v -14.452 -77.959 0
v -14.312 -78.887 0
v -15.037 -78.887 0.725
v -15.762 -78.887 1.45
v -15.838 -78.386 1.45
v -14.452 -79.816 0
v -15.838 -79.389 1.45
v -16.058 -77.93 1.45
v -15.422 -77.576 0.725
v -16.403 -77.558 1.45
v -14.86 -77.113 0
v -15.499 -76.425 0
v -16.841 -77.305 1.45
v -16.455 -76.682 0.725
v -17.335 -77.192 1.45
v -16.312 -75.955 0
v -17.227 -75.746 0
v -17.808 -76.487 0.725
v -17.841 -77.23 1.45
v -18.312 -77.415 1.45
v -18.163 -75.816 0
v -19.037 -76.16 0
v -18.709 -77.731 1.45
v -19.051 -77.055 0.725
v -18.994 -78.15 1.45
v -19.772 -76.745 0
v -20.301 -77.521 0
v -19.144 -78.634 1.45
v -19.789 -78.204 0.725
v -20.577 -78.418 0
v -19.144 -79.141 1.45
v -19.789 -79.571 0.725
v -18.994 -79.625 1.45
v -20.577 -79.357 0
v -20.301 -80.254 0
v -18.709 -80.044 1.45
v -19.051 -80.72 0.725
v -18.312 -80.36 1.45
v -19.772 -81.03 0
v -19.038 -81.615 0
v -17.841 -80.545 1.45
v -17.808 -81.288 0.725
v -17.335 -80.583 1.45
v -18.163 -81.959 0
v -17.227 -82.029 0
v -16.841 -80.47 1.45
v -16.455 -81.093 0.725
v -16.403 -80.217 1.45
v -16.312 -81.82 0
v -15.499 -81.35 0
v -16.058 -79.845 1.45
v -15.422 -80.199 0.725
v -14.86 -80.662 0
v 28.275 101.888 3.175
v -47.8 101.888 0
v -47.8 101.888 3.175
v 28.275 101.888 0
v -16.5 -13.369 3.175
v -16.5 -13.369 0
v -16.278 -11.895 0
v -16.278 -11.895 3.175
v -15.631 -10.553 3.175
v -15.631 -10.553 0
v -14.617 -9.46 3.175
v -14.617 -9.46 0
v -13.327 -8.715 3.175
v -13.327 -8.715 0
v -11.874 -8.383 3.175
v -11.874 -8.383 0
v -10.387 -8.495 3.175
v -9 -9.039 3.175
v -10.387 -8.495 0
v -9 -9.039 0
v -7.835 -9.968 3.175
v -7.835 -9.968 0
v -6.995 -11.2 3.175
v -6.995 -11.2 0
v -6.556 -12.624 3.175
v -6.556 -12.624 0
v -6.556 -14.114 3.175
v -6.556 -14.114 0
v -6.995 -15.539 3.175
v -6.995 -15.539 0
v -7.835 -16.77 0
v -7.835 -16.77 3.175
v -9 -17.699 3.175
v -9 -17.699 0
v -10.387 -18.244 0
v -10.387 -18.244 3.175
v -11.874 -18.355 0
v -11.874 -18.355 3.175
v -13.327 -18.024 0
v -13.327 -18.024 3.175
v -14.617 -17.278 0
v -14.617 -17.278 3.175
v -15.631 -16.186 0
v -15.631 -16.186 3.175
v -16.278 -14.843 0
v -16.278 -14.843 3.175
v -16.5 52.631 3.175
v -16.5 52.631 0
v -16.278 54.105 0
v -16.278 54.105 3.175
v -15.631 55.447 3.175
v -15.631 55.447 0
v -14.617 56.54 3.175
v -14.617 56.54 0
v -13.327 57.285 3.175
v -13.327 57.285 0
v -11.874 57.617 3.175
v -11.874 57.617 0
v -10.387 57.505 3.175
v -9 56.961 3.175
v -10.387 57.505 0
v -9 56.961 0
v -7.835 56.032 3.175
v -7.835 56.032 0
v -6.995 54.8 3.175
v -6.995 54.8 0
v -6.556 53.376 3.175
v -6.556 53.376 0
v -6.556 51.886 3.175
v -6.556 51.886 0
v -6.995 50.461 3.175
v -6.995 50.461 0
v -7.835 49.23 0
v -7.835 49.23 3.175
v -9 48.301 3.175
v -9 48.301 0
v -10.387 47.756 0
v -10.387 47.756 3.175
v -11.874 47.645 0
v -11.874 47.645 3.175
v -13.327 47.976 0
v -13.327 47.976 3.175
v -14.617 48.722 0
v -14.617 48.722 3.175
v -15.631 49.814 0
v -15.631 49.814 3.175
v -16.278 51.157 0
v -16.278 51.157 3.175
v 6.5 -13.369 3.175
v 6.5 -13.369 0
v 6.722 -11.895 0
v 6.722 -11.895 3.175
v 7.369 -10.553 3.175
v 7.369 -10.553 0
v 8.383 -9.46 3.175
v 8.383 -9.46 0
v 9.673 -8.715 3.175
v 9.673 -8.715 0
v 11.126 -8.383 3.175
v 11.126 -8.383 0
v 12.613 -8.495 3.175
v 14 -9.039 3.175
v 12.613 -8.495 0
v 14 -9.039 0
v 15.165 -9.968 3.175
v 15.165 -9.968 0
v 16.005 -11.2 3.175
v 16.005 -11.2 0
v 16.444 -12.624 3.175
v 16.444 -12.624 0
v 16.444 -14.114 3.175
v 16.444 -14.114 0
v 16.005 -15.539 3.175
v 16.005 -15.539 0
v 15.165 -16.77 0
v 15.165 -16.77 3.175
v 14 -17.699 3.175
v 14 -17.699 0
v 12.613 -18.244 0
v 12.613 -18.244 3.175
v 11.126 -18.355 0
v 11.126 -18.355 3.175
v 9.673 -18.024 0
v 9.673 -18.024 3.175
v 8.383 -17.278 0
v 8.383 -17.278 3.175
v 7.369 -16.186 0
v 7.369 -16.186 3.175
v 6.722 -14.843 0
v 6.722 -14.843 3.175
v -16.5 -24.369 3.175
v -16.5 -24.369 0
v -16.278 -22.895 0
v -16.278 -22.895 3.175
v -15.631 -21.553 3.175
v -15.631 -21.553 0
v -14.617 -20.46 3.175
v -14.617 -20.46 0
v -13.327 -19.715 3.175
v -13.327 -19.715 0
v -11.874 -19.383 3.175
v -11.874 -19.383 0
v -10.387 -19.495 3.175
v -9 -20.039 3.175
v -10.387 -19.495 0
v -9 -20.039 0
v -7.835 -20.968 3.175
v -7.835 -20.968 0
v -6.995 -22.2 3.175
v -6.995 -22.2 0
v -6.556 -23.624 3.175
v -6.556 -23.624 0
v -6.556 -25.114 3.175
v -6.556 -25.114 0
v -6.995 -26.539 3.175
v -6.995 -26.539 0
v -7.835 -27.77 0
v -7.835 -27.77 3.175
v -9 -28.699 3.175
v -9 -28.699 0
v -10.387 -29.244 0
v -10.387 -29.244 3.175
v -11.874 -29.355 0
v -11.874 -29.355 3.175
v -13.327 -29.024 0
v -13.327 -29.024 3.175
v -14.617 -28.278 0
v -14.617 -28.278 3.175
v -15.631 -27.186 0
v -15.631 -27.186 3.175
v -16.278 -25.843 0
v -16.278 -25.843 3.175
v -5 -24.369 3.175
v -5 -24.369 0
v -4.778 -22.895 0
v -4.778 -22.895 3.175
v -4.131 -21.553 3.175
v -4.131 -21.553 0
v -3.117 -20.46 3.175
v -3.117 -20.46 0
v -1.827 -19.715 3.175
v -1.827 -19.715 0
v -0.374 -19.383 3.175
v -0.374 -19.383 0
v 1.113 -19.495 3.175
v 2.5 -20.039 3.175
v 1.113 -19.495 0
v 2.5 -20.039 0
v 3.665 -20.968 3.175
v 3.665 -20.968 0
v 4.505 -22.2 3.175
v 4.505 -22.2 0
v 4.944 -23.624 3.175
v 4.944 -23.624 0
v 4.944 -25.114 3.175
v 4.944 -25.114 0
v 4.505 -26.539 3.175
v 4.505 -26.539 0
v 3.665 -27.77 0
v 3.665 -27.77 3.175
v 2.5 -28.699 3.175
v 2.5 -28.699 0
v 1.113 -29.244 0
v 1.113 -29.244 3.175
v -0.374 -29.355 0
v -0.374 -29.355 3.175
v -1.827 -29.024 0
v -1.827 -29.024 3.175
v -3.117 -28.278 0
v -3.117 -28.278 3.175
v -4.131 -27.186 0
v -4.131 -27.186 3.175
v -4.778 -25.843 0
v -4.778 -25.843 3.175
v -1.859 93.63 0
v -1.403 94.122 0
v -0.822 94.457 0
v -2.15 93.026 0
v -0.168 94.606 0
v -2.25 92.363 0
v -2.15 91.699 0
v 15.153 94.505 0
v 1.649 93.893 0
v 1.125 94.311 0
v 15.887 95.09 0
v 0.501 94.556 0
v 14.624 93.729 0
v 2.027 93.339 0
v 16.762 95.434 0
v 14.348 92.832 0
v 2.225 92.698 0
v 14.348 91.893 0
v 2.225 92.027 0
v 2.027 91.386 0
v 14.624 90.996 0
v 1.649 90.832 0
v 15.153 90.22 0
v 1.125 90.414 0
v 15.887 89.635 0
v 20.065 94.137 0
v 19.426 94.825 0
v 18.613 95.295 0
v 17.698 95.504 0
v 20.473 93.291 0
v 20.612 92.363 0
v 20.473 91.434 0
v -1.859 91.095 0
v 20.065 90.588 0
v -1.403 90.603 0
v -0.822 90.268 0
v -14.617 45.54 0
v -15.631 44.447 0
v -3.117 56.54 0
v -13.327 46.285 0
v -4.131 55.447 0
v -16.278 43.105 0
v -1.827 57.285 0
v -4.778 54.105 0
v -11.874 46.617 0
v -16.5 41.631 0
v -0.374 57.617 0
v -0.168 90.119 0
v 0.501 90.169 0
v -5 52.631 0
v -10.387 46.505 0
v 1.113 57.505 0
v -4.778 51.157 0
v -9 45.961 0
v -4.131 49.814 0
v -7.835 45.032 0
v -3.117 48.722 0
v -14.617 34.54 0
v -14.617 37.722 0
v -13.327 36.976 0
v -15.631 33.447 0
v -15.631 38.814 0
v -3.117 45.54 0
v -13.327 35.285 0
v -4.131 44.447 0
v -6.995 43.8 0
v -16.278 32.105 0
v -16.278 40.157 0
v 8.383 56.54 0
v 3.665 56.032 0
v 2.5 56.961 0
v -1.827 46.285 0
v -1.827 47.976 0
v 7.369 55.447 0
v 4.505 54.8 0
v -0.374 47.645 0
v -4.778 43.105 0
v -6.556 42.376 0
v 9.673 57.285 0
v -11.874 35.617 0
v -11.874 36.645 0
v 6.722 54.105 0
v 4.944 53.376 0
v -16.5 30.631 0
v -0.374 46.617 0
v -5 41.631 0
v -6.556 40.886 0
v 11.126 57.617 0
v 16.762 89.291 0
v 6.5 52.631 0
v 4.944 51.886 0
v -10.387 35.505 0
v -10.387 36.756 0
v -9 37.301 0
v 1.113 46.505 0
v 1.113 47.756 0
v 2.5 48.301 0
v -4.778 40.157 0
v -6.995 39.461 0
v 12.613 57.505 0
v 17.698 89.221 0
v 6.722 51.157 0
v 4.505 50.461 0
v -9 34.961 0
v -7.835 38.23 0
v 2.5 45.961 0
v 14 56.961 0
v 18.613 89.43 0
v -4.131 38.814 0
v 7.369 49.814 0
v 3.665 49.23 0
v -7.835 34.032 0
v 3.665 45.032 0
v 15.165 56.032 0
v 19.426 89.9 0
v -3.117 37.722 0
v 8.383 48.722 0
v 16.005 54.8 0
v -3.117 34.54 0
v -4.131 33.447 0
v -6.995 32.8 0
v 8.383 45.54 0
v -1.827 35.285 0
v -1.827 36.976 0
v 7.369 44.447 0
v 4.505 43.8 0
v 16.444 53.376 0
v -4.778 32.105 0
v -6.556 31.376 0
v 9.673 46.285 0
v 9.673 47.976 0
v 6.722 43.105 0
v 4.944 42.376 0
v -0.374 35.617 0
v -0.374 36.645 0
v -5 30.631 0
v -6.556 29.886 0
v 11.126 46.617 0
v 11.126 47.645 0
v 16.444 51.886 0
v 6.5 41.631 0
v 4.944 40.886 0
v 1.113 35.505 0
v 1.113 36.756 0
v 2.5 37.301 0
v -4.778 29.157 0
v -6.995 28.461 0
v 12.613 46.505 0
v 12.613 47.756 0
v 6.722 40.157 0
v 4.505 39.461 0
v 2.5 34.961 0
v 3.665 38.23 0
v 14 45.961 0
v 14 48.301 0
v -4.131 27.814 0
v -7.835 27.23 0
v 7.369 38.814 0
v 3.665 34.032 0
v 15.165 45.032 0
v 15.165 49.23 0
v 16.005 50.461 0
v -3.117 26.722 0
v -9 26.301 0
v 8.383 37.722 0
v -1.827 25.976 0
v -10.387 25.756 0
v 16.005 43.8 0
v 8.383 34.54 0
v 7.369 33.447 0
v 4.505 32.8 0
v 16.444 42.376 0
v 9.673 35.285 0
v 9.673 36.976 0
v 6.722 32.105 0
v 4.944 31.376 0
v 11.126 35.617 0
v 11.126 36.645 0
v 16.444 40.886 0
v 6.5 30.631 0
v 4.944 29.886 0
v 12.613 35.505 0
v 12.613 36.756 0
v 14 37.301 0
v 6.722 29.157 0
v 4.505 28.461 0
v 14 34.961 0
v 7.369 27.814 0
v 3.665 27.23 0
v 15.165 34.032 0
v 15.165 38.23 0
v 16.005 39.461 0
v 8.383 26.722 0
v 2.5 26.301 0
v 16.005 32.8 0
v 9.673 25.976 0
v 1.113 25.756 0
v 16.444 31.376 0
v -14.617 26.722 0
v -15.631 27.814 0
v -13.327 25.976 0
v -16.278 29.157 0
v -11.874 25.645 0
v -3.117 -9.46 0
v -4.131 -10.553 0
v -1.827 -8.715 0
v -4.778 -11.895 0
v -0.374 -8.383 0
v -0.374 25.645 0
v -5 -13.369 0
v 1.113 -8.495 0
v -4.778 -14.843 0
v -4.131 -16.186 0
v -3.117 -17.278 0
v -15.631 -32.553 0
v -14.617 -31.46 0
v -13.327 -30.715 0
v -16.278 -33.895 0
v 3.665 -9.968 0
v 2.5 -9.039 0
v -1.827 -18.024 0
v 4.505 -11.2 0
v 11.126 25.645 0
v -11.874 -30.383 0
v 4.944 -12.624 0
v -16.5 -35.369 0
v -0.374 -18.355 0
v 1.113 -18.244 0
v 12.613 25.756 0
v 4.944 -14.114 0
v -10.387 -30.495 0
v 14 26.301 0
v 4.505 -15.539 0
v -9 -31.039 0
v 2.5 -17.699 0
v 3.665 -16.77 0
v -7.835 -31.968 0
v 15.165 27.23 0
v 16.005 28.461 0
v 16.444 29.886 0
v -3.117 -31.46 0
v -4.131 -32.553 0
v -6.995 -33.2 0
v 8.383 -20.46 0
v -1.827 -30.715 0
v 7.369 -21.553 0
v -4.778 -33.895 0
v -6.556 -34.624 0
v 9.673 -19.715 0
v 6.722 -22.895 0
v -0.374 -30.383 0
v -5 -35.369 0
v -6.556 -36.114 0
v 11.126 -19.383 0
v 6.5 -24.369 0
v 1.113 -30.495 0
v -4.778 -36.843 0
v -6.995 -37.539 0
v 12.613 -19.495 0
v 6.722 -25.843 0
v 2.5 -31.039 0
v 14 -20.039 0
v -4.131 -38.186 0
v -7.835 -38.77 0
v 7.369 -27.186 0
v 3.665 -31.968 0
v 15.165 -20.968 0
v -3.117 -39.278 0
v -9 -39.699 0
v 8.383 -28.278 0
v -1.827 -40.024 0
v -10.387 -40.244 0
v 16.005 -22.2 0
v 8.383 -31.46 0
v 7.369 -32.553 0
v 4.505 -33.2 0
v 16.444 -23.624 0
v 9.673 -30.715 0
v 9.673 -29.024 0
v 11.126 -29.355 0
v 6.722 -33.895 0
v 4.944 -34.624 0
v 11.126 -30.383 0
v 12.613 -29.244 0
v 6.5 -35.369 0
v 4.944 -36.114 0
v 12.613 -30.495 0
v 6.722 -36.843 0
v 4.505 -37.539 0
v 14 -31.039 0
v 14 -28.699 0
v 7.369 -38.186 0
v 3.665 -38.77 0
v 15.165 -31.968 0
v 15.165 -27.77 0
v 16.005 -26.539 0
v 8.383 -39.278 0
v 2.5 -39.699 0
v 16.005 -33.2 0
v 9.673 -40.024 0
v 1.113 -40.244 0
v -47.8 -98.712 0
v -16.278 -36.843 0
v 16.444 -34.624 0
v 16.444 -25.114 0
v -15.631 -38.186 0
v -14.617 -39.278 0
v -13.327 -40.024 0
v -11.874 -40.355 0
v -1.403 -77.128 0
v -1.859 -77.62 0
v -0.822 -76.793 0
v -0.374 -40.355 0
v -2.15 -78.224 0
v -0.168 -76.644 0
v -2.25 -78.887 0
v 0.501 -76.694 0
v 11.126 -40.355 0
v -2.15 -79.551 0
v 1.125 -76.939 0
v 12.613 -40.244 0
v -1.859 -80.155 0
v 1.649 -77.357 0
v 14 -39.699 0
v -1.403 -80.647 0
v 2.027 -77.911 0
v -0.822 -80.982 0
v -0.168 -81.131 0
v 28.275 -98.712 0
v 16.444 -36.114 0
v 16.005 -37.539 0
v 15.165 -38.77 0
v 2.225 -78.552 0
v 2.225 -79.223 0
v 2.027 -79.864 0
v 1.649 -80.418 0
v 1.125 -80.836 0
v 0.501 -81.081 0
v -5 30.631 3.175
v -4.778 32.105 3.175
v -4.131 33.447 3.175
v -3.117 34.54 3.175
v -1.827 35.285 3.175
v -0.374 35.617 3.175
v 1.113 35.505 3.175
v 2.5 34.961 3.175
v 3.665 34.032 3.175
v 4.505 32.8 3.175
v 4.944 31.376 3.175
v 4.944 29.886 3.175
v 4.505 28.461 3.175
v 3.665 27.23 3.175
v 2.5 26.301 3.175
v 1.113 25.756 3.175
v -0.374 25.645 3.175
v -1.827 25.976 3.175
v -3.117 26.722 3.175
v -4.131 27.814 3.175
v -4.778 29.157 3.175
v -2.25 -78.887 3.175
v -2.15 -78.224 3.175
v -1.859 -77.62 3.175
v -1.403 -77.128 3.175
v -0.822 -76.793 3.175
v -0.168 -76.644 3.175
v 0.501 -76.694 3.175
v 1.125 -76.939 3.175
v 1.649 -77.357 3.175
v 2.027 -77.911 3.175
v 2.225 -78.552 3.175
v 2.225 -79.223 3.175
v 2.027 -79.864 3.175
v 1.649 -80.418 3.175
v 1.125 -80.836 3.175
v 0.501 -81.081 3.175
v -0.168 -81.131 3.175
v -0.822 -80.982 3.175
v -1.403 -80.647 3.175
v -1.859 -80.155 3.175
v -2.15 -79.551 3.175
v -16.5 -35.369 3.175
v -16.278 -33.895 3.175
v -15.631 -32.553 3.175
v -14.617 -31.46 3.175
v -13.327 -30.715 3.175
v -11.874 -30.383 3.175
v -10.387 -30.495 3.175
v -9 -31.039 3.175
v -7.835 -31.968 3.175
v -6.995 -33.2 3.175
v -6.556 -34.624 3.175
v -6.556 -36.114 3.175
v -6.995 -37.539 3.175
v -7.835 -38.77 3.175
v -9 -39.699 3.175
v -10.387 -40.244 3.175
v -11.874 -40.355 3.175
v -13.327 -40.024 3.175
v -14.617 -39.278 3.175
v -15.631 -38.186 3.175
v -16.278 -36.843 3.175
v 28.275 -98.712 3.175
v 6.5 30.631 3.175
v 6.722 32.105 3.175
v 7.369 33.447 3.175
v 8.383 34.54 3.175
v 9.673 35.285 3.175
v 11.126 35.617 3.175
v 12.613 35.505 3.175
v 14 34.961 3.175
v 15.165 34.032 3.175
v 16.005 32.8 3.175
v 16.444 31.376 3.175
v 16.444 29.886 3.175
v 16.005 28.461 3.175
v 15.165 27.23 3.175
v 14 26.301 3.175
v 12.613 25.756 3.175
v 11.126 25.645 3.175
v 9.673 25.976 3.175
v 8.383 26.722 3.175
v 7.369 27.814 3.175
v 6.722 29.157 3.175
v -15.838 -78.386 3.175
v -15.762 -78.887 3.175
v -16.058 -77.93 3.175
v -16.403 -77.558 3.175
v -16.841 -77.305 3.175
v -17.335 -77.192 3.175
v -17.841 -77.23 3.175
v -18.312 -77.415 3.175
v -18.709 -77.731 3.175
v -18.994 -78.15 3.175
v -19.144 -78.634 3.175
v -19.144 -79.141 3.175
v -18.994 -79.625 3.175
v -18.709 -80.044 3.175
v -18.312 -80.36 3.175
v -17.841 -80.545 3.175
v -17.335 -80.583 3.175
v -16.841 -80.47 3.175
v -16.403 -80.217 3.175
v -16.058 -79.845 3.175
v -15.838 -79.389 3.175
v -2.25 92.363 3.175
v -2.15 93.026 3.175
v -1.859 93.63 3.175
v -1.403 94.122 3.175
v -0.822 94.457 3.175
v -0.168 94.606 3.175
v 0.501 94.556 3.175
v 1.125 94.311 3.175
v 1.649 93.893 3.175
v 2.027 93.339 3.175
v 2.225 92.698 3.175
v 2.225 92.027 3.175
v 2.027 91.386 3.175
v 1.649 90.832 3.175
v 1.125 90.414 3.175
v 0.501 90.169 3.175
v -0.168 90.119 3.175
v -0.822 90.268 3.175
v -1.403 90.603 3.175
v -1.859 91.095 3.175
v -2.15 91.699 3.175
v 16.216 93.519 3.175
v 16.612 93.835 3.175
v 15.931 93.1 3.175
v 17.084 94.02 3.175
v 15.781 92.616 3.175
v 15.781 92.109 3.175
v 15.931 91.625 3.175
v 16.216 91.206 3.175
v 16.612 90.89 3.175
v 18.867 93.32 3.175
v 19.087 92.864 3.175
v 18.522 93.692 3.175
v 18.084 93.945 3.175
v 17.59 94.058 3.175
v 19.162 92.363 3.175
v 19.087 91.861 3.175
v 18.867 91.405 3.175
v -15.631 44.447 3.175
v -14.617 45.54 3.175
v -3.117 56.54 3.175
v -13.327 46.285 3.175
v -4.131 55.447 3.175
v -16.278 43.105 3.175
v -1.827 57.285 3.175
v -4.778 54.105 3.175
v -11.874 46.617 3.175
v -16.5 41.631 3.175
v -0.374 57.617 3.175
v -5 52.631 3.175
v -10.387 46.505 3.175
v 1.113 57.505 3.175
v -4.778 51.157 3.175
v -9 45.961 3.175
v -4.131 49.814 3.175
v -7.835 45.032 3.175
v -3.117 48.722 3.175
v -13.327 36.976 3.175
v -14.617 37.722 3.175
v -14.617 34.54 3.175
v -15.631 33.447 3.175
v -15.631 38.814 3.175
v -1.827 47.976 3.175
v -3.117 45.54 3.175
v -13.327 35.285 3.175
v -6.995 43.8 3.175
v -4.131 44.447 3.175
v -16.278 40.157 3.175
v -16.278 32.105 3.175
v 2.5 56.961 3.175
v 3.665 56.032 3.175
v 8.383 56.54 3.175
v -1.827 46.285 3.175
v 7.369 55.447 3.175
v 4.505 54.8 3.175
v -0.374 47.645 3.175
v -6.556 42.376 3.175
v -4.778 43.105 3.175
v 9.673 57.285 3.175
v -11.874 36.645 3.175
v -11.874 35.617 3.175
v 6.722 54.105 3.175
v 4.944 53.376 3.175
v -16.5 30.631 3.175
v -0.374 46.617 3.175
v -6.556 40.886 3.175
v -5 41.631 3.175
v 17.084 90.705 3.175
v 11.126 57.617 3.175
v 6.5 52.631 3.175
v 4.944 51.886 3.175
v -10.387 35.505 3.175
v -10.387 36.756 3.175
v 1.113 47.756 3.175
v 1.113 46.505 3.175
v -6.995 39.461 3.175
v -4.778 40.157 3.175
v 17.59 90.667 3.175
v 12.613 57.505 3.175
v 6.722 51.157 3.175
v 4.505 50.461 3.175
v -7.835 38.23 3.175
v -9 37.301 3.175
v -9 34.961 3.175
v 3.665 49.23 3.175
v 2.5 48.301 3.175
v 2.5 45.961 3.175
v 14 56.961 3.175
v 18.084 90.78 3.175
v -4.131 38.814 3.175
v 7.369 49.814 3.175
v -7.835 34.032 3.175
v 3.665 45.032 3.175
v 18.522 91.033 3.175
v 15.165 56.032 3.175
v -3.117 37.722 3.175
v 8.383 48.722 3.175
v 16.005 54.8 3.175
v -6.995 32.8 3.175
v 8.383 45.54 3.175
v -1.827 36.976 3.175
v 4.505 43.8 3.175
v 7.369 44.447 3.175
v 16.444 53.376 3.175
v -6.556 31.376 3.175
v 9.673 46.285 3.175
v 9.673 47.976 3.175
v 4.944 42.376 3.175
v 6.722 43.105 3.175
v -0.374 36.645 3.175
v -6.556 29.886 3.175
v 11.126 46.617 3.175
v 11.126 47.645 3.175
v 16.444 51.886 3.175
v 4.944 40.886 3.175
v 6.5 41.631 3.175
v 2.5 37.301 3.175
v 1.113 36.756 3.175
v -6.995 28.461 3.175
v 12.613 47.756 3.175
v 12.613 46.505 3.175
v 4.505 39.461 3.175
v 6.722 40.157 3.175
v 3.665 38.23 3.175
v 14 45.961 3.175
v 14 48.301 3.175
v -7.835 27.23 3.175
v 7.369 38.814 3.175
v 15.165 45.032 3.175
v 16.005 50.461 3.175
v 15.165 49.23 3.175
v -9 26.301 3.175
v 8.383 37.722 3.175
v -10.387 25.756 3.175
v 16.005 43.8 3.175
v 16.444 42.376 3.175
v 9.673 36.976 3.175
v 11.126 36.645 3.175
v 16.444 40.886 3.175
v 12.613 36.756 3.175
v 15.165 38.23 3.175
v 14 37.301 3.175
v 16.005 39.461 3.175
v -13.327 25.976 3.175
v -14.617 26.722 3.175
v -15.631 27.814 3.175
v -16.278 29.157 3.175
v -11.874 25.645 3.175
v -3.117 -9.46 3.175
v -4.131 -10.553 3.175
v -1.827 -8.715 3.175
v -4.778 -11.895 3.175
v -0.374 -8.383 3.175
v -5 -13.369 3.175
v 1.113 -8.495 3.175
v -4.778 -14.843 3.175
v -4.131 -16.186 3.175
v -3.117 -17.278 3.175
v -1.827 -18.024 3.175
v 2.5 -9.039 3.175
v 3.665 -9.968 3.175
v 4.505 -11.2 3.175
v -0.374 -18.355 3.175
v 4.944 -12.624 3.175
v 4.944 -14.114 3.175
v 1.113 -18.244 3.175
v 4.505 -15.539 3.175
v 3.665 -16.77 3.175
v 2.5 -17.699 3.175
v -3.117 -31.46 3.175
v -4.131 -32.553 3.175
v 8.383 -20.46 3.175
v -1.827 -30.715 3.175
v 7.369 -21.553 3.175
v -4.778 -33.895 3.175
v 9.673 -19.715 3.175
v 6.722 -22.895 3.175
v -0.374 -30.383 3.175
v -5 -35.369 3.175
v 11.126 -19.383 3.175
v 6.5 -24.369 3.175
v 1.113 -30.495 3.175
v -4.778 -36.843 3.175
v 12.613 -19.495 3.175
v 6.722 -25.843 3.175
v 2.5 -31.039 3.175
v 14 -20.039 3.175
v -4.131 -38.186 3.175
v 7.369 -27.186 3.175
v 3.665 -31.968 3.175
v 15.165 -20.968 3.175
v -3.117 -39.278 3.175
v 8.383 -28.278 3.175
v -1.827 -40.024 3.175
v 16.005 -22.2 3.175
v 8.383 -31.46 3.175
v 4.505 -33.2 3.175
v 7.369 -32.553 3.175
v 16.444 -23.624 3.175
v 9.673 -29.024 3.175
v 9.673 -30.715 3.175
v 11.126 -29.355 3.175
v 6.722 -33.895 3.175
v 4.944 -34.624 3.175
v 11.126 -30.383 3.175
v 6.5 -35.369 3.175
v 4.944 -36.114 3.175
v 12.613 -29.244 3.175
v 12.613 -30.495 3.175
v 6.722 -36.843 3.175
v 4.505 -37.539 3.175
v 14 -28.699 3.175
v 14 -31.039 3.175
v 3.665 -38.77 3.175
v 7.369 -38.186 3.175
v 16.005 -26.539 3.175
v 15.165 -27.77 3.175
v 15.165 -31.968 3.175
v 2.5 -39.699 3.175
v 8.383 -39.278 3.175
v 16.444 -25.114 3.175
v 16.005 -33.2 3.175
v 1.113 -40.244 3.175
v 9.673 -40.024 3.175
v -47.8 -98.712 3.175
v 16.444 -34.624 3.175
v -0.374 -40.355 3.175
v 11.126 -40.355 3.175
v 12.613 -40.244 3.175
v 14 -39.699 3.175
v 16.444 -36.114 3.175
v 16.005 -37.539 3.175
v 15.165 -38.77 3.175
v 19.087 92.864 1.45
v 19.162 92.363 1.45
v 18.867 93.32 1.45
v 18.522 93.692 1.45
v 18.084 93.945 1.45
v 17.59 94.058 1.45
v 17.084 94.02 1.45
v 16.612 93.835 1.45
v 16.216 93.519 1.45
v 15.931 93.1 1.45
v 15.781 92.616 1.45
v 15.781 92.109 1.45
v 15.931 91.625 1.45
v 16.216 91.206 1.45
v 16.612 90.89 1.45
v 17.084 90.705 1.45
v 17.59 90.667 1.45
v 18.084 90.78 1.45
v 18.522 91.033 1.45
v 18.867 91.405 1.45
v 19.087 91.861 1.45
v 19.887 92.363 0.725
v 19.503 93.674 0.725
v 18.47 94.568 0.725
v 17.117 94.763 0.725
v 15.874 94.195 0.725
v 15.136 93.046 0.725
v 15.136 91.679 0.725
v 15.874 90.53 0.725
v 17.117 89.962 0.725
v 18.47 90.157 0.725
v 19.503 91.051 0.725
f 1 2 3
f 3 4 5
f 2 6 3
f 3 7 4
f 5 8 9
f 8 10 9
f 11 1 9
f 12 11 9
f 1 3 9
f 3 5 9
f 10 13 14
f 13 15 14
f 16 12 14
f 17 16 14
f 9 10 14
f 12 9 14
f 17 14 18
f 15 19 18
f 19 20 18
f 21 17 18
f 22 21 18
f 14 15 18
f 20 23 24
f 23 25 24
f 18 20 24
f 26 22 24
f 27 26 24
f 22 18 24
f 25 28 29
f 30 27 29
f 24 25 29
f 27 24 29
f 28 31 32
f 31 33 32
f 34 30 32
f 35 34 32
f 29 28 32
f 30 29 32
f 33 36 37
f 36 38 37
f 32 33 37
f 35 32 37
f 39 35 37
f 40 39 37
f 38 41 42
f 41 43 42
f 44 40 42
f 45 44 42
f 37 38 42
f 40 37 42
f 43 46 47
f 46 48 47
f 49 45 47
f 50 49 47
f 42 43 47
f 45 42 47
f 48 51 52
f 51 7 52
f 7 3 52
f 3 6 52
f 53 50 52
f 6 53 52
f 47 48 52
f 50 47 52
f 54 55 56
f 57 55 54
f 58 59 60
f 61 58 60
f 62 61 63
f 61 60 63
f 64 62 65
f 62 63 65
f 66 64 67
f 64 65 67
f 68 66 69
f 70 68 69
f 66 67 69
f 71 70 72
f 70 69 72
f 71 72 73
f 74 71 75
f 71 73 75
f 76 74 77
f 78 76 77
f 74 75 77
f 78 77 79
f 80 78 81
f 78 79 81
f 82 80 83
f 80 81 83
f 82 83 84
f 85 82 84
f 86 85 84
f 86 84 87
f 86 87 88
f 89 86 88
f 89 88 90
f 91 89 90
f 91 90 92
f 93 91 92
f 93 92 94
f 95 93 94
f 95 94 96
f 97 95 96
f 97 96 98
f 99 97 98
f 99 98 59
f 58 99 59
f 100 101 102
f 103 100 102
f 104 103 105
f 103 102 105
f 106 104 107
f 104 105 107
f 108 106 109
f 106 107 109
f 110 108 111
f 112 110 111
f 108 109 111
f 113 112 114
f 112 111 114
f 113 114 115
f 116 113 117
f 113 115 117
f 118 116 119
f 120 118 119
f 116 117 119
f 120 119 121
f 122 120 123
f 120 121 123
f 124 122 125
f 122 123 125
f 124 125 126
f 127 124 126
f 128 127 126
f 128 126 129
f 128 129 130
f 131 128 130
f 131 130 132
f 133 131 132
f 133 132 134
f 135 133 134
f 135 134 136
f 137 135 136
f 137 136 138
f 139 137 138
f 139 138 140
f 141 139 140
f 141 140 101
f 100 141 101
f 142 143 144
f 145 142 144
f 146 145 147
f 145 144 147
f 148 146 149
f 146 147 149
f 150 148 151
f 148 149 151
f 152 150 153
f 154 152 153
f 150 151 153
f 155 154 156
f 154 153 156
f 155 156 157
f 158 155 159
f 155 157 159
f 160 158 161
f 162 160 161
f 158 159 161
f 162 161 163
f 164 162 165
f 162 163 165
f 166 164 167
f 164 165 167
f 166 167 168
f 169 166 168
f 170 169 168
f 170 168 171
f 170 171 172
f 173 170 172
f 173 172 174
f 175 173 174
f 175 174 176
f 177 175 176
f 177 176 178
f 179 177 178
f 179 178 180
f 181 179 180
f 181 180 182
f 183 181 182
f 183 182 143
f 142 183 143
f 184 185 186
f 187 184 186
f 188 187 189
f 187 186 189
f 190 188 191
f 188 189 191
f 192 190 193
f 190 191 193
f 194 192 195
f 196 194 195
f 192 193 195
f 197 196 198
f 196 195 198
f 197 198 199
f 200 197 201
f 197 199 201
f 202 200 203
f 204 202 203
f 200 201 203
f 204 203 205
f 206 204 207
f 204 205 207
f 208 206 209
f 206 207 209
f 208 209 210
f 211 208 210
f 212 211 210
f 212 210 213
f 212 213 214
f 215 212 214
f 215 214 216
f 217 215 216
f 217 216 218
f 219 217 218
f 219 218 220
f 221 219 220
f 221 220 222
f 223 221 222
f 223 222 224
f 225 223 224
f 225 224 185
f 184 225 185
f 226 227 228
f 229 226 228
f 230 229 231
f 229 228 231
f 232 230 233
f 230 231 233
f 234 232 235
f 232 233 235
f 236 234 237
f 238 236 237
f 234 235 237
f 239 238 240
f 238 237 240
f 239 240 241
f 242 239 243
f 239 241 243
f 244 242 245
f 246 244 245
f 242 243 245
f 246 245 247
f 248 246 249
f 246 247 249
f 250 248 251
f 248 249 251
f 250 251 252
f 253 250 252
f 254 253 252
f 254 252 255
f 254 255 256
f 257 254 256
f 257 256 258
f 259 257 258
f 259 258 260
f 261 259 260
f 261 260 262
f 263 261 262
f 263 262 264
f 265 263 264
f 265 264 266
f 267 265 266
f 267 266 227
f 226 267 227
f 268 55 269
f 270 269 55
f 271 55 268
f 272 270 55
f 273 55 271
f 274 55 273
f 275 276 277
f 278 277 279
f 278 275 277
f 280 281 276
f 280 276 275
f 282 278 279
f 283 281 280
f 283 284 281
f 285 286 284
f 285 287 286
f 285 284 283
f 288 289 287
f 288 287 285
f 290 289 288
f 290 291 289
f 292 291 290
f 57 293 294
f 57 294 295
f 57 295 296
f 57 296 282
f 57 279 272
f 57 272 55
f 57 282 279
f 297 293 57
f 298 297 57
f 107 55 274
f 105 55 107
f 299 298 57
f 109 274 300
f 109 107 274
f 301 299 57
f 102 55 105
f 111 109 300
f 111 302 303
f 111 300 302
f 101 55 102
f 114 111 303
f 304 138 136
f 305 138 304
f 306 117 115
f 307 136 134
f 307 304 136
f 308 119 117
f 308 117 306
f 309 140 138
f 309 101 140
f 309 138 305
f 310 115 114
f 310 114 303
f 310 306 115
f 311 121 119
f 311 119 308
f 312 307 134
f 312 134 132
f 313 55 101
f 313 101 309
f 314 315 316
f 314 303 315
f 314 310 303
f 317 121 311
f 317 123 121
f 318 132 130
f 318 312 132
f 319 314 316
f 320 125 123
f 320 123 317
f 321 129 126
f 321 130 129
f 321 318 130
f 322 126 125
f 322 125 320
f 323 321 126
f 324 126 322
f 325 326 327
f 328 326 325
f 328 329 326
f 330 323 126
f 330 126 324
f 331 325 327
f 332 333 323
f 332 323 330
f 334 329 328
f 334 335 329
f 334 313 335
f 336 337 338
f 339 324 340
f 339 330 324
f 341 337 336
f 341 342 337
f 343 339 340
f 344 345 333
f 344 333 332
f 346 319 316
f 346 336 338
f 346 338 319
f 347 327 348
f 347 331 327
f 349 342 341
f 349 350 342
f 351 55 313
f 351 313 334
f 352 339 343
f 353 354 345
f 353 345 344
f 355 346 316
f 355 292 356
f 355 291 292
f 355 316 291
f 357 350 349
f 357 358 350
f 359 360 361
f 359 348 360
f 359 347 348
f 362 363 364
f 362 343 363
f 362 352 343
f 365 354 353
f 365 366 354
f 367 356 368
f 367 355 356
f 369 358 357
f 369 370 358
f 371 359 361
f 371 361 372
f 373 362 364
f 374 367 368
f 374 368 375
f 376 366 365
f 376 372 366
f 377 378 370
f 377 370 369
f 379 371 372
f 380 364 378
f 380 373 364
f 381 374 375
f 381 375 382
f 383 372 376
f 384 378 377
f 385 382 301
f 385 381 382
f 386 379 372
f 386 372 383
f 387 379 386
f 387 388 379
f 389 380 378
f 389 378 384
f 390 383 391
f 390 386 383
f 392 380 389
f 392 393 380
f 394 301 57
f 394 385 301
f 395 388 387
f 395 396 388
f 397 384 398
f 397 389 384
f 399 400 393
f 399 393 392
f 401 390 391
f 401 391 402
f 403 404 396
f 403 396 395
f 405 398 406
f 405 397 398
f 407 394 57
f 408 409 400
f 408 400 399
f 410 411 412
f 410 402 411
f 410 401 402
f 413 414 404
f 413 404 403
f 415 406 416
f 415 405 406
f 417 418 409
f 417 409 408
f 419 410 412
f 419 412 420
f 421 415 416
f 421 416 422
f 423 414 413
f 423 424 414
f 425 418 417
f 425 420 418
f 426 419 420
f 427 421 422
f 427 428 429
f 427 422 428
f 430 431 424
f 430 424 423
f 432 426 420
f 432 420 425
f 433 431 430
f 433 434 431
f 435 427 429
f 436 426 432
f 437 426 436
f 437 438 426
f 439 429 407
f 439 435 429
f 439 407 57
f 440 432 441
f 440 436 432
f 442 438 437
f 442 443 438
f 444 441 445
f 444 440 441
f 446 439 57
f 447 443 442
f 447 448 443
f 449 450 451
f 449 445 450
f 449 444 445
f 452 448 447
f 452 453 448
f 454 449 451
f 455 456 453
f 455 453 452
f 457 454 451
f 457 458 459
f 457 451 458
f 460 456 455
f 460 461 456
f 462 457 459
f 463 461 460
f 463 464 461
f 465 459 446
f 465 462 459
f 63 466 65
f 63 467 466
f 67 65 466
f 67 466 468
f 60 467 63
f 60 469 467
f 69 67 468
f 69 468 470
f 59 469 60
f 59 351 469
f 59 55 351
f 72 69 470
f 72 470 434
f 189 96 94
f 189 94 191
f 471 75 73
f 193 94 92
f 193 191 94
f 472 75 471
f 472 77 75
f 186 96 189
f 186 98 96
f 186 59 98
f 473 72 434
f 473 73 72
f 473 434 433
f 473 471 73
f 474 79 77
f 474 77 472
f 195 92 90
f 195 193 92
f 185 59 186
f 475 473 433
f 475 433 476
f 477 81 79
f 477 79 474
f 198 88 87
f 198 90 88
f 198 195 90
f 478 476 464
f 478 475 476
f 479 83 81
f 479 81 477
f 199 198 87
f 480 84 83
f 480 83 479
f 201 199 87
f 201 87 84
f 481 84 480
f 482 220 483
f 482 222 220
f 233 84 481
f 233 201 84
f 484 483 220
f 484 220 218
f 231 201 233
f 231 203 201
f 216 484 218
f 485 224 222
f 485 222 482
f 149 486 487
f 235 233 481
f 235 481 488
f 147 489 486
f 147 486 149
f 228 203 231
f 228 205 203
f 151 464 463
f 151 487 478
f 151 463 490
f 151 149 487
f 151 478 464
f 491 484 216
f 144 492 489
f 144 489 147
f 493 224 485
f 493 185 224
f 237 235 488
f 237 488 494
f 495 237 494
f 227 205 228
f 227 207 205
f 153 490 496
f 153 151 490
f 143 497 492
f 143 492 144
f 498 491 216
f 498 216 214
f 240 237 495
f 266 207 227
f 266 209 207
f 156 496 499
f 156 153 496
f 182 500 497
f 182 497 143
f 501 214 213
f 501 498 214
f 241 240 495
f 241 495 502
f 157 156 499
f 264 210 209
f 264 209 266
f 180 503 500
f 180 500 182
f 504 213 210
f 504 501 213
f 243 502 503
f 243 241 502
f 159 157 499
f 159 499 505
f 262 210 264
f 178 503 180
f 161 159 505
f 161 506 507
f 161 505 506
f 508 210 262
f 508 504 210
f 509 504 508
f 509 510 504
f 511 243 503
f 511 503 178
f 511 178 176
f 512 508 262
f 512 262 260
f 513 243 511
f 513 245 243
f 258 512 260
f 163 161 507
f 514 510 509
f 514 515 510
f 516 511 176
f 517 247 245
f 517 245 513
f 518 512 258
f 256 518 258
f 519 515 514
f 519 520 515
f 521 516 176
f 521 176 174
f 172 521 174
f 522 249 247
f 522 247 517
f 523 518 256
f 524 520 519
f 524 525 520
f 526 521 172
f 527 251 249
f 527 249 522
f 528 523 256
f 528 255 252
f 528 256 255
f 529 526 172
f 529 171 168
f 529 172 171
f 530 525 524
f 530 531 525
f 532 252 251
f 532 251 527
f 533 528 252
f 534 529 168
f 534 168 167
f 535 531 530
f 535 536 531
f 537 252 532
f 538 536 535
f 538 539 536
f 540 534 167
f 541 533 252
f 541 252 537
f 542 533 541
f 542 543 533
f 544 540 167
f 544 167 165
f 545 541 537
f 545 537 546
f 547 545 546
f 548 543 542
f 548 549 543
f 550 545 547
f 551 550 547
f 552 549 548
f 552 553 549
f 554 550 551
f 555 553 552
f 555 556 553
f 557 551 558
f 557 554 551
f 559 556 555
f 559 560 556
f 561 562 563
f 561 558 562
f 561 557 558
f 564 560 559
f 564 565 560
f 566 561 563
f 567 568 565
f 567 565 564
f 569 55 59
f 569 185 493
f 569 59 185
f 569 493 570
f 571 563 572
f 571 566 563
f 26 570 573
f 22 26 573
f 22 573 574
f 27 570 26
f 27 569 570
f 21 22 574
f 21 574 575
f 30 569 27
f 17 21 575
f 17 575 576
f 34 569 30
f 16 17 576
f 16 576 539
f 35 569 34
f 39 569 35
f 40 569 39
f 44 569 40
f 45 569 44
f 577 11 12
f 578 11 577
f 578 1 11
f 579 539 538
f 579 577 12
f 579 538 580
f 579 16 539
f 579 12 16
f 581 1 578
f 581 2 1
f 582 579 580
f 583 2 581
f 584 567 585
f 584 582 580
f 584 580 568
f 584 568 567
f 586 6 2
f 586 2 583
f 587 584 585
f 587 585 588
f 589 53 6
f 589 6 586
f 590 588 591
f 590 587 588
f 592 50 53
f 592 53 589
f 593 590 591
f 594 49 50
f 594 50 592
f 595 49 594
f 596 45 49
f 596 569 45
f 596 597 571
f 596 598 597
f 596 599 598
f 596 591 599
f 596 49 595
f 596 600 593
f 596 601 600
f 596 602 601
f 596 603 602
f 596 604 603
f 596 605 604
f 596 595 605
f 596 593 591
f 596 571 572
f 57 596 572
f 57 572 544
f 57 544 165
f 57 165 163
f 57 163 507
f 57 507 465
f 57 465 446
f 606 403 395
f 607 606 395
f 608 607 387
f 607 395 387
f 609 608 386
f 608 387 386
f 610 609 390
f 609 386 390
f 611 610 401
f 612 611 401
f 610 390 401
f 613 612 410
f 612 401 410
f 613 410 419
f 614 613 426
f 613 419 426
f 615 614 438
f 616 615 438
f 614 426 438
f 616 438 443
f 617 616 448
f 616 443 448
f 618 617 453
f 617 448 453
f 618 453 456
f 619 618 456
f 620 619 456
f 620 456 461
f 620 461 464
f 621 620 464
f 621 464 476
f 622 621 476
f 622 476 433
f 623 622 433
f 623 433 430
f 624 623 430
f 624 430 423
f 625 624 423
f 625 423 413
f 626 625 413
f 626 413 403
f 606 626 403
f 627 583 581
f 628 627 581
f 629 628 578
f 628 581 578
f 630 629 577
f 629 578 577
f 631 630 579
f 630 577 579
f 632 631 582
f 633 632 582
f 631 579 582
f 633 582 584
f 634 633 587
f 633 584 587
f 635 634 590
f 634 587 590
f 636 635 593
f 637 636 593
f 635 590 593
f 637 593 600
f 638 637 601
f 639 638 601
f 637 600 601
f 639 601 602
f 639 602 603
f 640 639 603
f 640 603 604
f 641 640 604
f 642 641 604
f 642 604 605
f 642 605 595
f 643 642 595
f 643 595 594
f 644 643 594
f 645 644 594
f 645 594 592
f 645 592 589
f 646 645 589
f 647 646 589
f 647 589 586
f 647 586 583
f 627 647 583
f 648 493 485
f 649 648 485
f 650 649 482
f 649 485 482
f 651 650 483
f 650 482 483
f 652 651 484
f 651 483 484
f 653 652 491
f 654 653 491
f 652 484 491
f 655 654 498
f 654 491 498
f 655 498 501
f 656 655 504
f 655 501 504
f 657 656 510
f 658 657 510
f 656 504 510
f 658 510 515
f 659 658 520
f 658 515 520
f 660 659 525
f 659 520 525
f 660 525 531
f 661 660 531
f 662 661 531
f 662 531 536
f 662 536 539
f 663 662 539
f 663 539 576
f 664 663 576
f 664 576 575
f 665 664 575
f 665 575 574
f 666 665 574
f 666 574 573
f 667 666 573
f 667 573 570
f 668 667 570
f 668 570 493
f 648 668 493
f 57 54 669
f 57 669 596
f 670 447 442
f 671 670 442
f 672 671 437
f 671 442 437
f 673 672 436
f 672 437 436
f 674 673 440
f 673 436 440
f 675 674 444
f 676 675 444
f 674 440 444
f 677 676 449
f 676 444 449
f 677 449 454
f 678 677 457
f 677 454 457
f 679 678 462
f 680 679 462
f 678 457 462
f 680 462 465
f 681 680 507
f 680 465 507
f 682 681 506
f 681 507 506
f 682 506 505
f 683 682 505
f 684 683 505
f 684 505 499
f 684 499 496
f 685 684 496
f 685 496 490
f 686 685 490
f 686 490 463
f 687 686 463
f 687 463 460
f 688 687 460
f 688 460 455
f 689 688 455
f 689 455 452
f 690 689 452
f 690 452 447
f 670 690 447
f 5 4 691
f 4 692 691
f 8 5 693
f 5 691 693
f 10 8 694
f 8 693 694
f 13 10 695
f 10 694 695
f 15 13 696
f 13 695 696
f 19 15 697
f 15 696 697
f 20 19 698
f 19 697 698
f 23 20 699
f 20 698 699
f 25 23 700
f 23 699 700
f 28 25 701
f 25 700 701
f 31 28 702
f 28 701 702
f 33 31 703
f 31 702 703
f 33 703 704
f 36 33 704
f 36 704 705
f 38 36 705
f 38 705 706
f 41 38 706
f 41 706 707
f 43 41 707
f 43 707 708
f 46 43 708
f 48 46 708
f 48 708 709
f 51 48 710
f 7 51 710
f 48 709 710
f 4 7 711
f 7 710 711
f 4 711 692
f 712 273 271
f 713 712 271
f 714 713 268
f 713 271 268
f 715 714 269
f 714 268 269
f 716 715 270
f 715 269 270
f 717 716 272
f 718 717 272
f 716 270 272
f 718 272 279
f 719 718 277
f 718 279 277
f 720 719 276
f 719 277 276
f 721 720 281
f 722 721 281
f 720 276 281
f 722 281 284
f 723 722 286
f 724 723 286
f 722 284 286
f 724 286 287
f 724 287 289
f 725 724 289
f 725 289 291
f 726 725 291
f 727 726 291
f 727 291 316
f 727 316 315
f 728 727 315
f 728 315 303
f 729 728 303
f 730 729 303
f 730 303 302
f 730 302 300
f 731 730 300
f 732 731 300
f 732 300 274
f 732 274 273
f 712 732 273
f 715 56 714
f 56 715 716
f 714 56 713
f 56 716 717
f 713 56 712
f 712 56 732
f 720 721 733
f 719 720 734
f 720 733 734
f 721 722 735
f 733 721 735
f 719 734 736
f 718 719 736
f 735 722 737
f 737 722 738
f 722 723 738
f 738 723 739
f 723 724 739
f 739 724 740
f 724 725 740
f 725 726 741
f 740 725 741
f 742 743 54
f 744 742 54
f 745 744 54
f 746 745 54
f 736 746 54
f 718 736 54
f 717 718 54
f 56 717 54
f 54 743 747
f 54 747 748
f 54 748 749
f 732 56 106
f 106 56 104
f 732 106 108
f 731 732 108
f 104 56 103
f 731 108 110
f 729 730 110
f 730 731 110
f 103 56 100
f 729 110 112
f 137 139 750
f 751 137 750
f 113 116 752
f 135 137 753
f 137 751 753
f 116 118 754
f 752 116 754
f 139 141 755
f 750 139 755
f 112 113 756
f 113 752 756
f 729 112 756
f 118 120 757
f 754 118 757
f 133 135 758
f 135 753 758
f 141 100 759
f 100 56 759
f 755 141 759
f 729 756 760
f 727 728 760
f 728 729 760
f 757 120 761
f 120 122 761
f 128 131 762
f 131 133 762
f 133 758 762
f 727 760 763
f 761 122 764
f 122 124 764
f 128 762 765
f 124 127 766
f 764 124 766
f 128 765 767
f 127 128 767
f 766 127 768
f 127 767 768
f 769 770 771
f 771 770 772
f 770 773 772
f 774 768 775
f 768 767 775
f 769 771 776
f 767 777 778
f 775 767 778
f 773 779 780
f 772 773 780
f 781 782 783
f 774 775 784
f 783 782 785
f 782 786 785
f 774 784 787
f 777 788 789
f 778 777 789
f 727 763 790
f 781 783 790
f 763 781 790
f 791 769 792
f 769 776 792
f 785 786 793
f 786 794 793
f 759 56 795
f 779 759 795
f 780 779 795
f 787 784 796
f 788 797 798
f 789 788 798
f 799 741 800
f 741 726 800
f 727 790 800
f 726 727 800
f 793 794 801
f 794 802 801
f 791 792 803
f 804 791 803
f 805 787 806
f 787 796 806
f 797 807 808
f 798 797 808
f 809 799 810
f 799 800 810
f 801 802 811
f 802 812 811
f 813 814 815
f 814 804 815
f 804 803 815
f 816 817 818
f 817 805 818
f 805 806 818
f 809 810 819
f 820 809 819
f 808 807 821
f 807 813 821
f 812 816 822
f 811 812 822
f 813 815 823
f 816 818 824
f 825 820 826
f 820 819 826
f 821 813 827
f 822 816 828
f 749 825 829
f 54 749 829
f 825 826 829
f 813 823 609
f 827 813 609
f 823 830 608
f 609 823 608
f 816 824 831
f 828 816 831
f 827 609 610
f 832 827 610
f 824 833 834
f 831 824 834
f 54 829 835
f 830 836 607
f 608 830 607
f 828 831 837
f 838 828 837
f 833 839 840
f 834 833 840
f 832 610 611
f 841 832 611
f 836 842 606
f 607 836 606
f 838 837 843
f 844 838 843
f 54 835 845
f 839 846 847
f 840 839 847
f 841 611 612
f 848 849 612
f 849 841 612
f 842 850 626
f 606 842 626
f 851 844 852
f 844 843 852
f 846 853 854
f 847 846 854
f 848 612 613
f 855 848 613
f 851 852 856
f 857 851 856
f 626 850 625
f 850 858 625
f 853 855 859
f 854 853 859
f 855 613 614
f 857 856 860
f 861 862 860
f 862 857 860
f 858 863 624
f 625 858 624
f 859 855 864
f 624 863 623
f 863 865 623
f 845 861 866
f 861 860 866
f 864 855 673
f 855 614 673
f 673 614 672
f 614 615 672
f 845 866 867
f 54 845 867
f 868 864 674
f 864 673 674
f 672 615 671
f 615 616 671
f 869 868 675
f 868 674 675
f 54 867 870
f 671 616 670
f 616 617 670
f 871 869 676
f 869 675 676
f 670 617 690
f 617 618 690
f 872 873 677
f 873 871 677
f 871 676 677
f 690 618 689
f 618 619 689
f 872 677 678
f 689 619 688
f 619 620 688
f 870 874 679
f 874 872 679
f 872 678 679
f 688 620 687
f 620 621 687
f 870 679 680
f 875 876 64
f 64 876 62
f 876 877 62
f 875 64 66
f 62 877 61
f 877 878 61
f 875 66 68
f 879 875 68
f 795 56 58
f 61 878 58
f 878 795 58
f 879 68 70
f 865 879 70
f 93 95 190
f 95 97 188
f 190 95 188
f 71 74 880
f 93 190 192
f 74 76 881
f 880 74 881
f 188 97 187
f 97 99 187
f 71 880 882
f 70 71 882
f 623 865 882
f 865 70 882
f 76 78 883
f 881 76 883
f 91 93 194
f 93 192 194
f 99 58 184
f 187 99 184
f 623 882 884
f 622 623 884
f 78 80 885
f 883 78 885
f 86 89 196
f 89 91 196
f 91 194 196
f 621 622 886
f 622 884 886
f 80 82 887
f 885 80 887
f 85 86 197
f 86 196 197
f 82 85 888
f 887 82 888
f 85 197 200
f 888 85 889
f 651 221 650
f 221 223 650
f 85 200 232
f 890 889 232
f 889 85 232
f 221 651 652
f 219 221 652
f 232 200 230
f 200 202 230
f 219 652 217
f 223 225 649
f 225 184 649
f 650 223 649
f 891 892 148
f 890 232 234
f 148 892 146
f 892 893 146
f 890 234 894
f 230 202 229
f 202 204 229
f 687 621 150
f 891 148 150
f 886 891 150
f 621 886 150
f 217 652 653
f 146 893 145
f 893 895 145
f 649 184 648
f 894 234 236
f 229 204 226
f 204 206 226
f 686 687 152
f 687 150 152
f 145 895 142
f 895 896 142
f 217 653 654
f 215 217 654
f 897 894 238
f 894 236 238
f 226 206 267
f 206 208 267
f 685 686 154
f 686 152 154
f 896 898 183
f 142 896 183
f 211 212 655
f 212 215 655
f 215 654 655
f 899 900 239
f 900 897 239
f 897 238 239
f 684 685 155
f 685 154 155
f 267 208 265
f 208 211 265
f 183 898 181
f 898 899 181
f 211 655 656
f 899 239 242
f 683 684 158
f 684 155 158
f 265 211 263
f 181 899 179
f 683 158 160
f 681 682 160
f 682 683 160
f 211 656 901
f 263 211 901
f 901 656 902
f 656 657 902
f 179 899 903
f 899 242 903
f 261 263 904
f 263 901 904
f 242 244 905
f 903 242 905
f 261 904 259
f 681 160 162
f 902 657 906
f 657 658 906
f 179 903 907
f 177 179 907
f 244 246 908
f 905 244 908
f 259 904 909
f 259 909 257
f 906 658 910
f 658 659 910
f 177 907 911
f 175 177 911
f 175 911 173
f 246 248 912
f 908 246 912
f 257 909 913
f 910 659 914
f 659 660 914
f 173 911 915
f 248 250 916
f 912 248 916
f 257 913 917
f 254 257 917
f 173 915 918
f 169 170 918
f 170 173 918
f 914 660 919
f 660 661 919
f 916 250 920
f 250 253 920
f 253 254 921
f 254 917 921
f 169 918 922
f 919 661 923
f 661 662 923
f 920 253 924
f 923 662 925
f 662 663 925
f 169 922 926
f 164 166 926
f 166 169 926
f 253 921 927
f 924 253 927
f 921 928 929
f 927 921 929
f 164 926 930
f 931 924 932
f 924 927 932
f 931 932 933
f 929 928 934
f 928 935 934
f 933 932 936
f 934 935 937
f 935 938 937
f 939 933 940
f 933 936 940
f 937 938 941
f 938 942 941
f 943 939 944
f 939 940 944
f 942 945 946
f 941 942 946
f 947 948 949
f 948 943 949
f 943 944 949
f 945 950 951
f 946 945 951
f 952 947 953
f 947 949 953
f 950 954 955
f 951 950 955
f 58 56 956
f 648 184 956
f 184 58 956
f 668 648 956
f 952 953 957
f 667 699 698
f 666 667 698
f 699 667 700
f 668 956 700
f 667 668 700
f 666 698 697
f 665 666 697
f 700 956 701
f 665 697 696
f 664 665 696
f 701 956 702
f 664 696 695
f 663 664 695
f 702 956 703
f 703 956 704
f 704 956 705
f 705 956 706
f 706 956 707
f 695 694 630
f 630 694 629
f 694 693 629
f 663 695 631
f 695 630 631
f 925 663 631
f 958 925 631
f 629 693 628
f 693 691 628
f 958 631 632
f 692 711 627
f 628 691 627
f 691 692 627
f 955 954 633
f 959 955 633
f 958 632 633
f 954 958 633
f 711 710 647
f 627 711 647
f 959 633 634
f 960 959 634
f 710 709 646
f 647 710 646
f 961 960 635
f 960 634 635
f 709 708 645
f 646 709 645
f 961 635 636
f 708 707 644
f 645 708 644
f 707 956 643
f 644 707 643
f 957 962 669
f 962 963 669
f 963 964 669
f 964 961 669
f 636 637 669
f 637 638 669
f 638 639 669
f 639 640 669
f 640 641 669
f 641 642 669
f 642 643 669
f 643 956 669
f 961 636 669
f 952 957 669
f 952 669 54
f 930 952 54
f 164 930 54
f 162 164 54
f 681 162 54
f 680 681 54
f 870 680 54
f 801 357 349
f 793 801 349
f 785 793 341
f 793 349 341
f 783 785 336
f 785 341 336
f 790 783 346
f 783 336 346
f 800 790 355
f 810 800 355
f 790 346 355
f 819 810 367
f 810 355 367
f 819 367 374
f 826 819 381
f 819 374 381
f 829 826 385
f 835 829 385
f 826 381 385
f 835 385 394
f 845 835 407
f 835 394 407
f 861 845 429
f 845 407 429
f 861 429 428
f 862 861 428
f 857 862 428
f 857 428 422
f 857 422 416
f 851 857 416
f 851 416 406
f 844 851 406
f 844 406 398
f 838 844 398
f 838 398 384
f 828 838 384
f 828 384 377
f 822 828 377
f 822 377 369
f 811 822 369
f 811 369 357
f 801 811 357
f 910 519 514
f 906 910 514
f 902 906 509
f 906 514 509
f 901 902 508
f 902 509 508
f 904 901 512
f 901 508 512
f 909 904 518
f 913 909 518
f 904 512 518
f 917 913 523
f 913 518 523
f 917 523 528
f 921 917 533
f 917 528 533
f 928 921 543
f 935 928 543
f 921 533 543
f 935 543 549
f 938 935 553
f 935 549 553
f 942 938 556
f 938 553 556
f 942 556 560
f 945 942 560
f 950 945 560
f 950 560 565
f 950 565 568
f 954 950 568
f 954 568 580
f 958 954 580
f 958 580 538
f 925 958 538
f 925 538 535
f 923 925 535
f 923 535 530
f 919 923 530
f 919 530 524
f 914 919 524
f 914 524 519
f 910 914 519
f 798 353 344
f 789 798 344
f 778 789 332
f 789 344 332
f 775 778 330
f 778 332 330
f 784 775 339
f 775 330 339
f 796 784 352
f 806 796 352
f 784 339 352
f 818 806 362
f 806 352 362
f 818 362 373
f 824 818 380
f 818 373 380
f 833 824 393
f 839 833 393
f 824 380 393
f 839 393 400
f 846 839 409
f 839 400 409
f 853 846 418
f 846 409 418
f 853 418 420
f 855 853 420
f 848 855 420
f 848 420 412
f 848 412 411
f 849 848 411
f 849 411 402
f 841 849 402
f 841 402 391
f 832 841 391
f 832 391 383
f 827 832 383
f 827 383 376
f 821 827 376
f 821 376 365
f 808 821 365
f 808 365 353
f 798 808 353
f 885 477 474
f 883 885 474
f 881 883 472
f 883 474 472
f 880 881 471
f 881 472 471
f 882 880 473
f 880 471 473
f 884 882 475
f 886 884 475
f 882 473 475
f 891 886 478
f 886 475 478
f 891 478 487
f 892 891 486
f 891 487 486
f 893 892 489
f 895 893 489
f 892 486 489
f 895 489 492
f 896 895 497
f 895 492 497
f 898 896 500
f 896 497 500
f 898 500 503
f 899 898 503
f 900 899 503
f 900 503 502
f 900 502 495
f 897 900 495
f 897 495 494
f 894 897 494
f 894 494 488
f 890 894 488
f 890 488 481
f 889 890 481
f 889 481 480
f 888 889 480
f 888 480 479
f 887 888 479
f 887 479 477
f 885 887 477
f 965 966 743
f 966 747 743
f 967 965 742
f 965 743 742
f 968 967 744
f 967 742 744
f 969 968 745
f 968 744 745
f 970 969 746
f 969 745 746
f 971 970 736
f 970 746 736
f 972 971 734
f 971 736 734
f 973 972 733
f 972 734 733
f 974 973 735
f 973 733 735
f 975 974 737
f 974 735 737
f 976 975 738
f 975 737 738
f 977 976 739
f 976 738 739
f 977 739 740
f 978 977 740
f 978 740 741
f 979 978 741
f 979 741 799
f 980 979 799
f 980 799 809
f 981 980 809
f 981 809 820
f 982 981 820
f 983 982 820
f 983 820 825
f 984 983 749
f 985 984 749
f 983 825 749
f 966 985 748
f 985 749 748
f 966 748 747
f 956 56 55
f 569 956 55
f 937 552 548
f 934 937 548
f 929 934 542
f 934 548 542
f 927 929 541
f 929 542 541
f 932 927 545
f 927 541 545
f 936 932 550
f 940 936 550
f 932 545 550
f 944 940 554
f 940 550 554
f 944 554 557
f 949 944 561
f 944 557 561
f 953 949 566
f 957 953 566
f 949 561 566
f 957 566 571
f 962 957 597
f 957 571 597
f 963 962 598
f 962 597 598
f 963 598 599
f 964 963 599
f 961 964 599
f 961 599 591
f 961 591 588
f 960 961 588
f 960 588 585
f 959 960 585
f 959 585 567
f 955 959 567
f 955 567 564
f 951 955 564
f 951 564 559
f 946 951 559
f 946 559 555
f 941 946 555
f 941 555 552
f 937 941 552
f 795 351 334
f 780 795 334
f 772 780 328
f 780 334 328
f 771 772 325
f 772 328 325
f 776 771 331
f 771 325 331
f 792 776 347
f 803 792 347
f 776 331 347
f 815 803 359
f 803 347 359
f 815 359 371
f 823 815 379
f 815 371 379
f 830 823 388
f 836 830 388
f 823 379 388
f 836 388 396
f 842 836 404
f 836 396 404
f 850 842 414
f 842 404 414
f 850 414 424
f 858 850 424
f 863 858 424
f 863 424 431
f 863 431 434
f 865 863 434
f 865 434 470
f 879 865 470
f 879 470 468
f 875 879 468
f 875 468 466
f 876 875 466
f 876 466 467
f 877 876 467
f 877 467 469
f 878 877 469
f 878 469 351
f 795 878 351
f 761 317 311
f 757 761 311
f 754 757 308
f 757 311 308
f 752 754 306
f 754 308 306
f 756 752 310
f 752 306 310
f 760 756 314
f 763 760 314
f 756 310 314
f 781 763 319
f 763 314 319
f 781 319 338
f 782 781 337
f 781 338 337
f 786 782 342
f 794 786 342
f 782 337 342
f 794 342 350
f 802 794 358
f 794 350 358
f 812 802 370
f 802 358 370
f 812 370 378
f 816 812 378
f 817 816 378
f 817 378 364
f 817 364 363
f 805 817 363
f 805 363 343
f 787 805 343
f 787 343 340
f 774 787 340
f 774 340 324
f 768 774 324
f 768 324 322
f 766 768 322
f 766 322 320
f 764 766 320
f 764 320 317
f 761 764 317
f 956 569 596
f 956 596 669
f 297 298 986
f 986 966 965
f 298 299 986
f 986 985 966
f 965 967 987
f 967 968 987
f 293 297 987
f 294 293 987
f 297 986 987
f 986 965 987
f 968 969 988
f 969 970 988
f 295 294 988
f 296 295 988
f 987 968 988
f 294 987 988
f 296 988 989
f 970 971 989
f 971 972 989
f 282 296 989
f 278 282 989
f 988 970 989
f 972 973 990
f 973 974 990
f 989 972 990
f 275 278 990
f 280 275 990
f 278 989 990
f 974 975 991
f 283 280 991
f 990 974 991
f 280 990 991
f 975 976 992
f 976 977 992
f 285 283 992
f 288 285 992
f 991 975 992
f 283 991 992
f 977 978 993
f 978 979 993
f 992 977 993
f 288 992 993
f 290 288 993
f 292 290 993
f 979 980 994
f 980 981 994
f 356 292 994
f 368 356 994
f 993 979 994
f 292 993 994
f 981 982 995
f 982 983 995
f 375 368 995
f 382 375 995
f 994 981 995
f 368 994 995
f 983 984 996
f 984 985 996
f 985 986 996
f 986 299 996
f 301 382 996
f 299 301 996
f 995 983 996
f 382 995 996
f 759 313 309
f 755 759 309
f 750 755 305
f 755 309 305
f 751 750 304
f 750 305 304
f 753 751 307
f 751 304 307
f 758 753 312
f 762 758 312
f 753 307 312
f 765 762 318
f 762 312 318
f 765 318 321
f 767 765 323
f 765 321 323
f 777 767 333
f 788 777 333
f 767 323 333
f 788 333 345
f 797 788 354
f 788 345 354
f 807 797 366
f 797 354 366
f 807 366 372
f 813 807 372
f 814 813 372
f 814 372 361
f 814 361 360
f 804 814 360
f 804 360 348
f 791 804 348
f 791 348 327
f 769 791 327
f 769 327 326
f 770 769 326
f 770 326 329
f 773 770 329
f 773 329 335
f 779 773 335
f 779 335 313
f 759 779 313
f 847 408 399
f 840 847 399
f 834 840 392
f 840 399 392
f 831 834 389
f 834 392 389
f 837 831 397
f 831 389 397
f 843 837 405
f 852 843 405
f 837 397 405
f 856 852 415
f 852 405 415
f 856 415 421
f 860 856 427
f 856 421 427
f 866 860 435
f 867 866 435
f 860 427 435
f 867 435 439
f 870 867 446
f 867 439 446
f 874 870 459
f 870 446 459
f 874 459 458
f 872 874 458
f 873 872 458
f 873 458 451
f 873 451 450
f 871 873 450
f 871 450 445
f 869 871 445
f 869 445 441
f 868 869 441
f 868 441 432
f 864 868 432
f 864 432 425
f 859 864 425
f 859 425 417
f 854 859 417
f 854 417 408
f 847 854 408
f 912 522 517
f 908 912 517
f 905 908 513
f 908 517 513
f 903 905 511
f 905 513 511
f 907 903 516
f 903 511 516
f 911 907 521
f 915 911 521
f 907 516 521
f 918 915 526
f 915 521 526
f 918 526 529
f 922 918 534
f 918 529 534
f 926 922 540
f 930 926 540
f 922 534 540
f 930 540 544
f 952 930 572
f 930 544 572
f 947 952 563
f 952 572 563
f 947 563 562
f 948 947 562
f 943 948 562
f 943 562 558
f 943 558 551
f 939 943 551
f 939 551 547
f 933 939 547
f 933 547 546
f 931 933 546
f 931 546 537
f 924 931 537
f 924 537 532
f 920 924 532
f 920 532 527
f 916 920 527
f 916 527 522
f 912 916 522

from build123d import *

# Parameters (mm, degrees)
SKETCH1_W                                       = 56.55
SKETCH1_H                                       = 197.425
BOSS_EXTRUDE1_DEPTH                             = 3.175
SKETCH2_R                                       = 5
CUT_EXTRUDE1_DEPTH                              = 103.731270343
SKETCH5_W                                       = 3.175
SKETCH5_H                                       = 197.425
BOSS_EXTRUDE2_DEPTH                             = 19.525
SKETCH14_W                                      = 76.075
SKETCH14_H                                      = 3.175
BOSS_EXTRUDE3_DEPTH                             = 3.175
M4_CLEARANCE_HOLE1_D                            = 4.5
CSK_FOR_M3_FLAT_HEAD_MACHINE_SCREW3_D           = 3.4
CSK_FOR_M3_FLAT_HEAD_MACHINE_SCREW3_CSINK_D     = 6.3
CSK_FOR_M3_FLAT_HEAD_MACHINE_SCREW3_CSINK_ANGLE = 90


with BuildPart() as part:
    # Sketch1 → Boss-Extrude1 (new body)
    with BuildSketch(Plane.XY):
        Rectangle(SKETCH1_W, SKETCH1_H)
    extrude(amount=BOSS_EXTRUDE1_DEPTH)

    # Sketch2 → Cut-Extrude1 (cut, through all)
    with BuildSketch(Plane(origin=(0, 0, 0), x_dir=(-1, 0, 0), z_dir=(0, 0, -1))):
        with Locations((-11.5, 30.630837161)):
            Circle(SKETCH2_R)
        with Locations((-11.5, 52.630837161)):
            Circle(SKETCH2_R)
        with Locations((-11.5, 41.630837161)):
            Circle(SKETCH2_R)
        with Locations((0, 52.630837161)):
            Circle(SKETCH2_R)
        with Locations((0, 41.630837161)):
            Circle(SKETCH2_R)
        with Locations((0, 30.630837161)):
            Circle(SKETCH2_R)
        with Locations((11.5, 30.630837161)):
            Circle(SKETCH2_R)
        with Locations((11.5, 41.630837161)):
            Circle(SKETCH2_R)
        with Locations((11.5, 52.630837161)):
            Circle(SKETCH2_R)
        with Locations((-11.5, -35.369162839)):
            Circle(SKETCH2_R)
        with Locations((-11.5, -13.369162839)):
            Circle(SKETCH2_R)
        with Locations((-11.5, -24.369162839)):
            Circle(SKETCH2_R)
        with Locations((0, -13.369162839)):
            Circle(SKETCH2_R)
        with Locations((0, -24.369162839)):
            Circle(SKETCH2_R)
        with Locations((0, -35.369162839)):
            Circle(SKETCH2_R)
        with Locations((11.5, -35.369162839)):
            Circle(SKETCH2_R)
        with Locations((11.5, -13.369162839)):
            Circle(SKETCH2_R)
        with Locations((11.5, -24.369162839)):
            Circle(SKETCH2_R)
    extrude(amount=-CUT_EXTRUDE1_DEPTH, mode=Mode.SUBTRACT)

    # Sketch5 → Boss-Extrude2 (add)
    with BuildSketch(Plane.ZY.offset(28.275)):
        with Locations((1.5875, 0)):
            Rectangle(SKETCH5_W, SKETCH5_H)
    extrude(amount=BOSS_EXTRUDE2_DEPTH)

    # Sketch14 → Boss-Extrude3 (add)
    with BuildSketch(Plane(origin=(0, 98.7125, 0), x_dir=(1, 0, 0), z_dir=(0, 1, 0))):
        with Locations((-9.7625, -1.5875)):
            Rectangle(SKETCH14_W, SKETCH14_H)
    extrude(amount=BOSS_EXTRUDE3_DEPTH)

    # M4 Clearance Hole1 (through all)
    with Locations(Plane.XY.offset(3.175)):
        with Locations((0, 92.3625001), (0, -78.8874999)):
            Hole(M4_CLEARANCE_HOLE1_D / 2)

    # CSK for M3 Flat Head Machine Screw3 (through all)
    with Locations(Plane(origin=(0, 0, 0), x_dir=(-1, 0, 0), z_dir=(0, 0, -1))):
        with Locations((17.4625, -78.8874999), (-17.4625, 92.3625001)):
            CounterSinkHole(CSK_FOR_M3_FLAT_HEAD_MACHINE_SCREW3_D / 2, CSK_FOR_M3_FLAT_HEAD_MACHINE_SCREW3_CSINK_D / 2, counter_sink_angle=CSK_FOR_M3_FLAT_HEAD_MACHINE_SCREW3_CSINK_ANGLE)


solid = part.part
